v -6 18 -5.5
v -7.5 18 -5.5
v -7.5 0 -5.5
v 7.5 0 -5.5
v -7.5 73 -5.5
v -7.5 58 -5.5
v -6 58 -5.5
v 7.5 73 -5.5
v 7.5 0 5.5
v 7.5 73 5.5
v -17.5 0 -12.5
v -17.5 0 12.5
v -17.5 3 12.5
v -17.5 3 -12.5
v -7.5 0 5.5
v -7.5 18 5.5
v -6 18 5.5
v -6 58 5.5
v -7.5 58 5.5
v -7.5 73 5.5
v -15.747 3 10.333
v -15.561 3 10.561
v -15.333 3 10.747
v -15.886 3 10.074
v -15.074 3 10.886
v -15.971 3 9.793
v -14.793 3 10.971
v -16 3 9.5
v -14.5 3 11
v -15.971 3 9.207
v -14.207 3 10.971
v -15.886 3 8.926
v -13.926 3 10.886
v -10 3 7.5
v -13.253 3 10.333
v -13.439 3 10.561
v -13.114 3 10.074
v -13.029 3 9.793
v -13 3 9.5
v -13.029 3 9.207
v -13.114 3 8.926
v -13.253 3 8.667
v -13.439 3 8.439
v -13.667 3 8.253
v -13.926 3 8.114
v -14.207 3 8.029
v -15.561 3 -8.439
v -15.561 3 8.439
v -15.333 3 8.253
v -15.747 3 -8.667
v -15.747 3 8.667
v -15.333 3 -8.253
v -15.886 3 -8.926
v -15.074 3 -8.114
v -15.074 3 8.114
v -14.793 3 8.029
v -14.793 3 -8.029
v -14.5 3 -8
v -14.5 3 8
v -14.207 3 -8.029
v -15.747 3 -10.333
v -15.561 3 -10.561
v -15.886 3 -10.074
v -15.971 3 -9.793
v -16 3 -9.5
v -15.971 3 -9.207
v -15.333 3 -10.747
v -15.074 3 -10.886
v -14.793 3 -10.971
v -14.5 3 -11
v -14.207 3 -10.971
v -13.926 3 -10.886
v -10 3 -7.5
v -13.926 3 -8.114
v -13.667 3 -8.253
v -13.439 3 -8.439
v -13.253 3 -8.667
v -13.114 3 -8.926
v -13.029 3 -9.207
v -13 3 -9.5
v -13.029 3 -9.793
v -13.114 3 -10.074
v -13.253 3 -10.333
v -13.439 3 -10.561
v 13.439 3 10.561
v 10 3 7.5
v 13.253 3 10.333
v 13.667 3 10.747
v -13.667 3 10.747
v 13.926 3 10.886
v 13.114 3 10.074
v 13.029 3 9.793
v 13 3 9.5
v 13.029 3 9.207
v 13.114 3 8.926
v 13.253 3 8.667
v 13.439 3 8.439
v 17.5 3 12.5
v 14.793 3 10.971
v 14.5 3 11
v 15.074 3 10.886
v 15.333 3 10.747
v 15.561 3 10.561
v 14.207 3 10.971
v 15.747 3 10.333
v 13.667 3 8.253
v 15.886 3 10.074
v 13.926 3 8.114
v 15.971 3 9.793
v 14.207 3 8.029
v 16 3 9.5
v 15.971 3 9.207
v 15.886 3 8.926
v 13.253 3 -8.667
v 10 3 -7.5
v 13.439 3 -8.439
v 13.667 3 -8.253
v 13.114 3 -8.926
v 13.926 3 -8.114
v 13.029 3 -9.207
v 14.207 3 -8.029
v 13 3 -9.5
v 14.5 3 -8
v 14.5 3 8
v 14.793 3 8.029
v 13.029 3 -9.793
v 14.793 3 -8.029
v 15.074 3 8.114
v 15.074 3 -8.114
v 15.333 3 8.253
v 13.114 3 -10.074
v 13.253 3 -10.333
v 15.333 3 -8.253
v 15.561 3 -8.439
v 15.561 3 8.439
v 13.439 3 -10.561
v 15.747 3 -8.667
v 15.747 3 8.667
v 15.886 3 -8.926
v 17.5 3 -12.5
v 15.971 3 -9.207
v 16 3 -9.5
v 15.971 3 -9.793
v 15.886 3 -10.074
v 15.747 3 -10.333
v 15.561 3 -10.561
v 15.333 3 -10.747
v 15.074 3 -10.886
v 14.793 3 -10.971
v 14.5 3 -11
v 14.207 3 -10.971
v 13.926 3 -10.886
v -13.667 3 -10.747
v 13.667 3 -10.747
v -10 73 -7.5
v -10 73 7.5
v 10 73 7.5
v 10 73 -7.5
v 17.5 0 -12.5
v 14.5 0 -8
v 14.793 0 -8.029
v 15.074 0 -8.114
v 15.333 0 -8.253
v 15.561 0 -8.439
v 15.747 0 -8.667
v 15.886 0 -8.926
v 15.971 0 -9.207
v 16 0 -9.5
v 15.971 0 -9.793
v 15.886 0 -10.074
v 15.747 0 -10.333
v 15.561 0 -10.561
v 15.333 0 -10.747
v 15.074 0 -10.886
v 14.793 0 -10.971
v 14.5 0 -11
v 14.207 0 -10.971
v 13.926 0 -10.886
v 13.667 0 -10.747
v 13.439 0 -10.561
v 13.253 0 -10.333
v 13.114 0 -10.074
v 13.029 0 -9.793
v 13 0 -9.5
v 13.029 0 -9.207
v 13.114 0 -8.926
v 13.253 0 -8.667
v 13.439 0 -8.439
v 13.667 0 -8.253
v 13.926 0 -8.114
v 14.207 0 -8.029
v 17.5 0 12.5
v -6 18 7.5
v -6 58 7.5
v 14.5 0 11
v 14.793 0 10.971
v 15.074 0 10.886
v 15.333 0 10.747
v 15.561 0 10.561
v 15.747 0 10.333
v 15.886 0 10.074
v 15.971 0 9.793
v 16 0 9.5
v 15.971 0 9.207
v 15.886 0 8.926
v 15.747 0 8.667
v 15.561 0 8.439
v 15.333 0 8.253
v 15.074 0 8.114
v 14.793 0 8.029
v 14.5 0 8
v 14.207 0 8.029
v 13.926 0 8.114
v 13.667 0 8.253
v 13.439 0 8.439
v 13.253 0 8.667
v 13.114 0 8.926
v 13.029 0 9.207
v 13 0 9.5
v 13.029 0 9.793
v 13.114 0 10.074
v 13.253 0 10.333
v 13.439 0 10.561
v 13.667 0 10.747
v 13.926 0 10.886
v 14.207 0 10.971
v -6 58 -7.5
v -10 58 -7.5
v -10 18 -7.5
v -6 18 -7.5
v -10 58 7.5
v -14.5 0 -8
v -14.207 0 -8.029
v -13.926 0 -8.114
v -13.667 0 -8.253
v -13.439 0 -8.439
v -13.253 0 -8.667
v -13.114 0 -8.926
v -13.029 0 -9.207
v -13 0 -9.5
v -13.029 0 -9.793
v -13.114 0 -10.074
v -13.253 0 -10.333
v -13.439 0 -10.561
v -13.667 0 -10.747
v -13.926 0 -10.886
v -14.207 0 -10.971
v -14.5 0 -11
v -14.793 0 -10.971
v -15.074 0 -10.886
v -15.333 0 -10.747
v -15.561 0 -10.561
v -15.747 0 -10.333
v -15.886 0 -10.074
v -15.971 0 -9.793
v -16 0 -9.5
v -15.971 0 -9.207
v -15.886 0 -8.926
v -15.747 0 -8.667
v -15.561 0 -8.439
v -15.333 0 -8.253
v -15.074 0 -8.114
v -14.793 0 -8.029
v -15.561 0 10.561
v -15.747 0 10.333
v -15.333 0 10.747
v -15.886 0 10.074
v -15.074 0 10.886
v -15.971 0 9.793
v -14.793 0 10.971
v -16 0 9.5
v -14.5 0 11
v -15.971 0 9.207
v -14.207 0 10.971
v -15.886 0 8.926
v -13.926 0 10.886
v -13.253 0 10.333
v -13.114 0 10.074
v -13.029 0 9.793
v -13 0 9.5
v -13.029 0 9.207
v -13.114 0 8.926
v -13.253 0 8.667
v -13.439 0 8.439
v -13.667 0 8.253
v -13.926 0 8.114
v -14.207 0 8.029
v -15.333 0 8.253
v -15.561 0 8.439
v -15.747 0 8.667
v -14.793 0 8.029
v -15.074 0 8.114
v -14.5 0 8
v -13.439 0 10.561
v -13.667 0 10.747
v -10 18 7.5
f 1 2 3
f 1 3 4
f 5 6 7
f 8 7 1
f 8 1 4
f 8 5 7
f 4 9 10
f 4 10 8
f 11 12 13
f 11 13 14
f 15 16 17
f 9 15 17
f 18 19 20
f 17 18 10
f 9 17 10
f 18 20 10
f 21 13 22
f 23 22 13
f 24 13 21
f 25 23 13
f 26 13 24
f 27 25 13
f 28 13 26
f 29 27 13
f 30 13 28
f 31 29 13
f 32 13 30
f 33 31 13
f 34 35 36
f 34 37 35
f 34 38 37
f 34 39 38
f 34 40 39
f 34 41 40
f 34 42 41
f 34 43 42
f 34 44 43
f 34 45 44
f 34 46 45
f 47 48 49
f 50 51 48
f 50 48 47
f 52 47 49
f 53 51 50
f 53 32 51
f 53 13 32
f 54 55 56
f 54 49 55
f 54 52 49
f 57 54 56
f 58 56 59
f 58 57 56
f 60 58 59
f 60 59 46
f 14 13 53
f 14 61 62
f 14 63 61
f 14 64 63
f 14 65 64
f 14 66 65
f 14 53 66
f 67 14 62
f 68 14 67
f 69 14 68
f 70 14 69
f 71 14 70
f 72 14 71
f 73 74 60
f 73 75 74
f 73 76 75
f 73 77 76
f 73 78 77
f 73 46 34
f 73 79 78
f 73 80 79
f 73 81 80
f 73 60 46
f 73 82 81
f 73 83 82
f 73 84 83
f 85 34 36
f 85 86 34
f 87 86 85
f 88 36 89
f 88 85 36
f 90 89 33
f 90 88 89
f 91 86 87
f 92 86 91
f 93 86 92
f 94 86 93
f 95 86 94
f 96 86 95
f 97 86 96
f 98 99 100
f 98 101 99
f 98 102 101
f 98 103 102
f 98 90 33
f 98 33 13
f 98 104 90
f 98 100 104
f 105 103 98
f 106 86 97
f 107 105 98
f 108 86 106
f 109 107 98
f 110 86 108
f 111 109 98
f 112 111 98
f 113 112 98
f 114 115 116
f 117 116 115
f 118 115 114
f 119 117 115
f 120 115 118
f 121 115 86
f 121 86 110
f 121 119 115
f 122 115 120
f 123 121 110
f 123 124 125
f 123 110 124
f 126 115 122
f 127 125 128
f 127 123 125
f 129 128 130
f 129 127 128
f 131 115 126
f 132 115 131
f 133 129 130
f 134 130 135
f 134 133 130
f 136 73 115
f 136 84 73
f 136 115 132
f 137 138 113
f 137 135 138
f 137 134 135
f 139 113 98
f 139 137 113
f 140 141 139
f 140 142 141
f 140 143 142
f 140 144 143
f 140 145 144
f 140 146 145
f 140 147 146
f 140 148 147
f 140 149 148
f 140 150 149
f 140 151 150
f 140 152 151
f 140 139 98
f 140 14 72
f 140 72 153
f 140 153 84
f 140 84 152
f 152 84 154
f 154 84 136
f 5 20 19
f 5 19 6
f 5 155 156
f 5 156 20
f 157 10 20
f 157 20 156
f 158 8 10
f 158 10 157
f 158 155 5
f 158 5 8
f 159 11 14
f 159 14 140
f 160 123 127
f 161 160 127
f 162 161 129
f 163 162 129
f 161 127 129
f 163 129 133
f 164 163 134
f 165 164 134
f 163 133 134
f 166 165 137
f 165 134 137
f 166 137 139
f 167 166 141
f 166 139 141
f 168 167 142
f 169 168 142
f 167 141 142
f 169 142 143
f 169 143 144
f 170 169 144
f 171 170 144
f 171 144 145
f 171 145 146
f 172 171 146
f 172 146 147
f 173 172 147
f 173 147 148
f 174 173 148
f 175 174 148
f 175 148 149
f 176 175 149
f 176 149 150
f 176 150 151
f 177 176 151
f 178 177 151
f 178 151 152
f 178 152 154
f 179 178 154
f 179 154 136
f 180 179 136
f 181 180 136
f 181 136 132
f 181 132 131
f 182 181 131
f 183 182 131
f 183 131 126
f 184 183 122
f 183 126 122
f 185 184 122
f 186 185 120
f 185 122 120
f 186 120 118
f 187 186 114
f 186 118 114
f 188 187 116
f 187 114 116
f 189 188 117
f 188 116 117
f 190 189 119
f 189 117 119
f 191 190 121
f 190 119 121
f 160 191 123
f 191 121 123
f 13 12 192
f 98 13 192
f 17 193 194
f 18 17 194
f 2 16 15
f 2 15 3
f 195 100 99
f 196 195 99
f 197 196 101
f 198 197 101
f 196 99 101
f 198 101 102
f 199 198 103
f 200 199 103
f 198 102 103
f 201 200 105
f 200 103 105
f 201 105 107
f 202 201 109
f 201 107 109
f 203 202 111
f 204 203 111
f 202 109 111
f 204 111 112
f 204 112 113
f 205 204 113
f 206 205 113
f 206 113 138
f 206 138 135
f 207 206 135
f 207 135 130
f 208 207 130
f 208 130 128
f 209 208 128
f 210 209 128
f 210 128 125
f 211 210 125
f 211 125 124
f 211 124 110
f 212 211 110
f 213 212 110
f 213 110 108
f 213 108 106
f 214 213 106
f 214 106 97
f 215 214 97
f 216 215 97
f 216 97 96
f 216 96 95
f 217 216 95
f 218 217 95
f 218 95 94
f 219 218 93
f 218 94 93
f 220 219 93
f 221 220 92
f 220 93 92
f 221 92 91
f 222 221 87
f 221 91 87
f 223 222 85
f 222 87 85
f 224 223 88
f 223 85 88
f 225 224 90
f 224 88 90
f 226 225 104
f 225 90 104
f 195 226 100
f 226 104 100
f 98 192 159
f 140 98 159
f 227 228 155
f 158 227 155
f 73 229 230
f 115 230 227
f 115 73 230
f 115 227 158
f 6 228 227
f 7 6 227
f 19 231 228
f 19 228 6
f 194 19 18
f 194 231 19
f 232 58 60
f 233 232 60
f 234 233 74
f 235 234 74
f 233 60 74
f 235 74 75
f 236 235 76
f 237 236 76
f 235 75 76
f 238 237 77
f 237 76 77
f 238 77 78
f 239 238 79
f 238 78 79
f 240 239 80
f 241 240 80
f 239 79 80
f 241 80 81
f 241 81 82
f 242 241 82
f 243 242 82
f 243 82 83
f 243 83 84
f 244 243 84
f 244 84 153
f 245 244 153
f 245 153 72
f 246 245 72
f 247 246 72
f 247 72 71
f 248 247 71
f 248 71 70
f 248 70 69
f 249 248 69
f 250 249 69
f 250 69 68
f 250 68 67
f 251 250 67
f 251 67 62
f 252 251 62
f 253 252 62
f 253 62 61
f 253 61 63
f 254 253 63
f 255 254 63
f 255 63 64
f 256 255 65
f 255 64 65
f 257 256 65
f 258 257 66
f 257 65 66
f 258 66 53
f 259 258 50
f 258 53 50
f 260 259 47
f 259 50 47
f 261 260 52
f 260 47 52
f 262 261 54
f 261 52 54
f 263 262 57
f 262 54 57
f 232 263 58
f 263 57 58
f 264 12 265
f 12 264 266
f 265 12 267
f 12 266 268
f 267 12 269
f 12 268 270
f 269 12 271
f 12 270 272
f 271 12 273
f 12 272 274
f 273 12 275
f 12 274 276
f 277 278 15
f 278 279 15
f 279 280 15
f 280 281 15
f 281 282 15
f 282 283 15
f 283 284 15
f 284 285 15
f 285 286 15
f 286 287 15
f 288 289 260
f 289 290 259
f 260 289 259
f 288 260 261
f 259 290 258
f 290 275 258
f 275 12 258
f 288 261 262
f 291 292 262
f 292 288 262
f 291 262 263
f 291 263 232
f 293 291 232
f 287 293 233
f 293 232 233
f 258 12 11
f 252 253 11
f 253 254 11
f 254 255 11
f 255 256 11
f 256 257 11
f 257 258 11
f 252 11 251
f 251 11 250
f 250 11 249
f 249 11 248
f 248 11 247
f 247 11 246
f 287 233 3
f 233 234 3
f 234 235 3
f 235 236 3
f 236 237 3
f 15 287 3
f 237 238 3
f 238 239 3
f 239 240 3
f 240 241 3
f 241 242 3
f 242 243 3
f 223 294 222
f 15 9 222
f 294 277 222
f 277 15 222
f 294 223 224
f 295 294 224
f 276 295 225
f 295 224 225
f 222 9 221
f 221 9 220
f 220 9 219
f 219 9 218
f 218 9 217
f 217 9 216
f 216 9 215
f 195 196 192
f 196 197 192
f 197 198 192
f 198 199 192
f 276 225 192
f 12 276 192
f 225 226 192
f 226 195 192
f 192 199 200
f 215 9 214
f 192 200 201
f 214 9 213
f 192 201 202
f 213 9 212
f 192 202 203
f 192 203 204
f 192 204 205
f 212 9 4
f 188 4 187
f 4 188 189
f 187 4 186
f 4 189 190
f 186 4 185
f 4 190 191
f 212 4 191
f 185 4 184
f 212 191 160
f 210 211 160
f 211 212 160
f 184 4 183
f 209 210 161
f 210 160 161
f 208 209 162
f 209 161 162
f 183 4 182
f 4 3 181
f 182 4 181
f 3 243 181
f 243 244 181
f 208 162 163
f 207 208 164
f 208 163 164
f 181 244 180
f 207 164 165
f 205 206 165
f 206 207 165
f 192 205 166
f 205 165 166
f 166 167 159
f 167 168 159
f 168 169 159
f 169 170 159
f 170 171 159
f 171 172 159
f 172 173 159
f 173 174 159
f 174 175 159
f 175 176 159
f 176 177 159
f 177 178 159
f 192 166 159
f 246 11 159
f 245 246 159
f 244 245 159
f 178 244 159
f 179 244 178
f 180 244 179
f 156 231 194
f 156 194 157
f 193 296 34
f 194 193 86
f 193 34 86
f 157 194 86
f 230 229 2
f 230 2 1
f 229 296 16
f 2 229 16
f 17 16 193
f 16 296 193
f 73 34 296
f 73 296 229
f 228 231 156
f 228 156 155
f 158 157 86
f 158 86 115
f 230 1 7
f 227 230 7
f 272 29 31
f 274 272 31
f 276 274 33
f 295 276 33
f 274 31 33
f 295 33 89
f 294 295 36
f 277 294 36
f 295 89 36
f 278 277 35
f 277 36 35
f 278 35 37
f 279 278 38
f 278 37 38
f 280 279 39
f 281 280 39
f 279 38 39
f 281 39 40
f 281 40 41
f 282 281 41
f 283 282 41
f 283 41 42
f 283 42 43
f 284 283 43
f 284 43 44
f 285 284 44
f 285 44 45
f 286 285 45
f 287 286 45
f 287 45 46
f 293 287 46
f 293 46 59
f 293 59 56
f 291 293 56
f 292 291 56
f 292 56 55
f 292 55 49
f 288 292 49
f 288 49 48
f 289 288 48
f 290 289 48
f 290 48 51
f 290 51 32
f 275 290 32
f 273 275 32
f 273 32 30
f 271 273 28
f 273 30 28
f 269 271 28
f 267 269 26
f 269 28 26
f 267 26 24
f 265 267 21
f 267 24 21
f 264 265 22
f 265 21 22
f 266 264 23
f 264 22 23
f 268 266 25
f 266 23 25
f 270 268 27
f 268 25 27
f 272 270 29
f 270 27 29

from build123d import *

# Parameters (mm, degrees)
SKETCH_1_W          = 35
SKETCH_1_H          = 25
EXTRUDE_1_DEPTH     = 3
SKETCH_2_W          = 20
SKETCH_2_H          = 15
EXTRUDE_2_DEPTH     = 70
CUT_EXTRUDE_1_REACH = 78.102
SKETCH_3_W          = 15
SKETCH_3_H          = 11
CUT_EXTRUDE_2_REACH = 79.687
SKETCH_4_W          = 4
SKETCH_4_H          = 40
CUT_EXTRUDE_3_REACH = 75.229
SKETCH_5_R          = 1.5


with BuildPart() as part:
    # 草图1 → 凸台-拉伸1 (new body)
    with BuildSketch(Plane(origin=(0, 0, 0), x_dir=(1, 0, 0), z_dir=(0, 1, 0))):
        Rectangle(SKETCH_1_W, SKETCH_1_H)
    extrude(amount=EXTRUDE_1_DEPTH)

    # 草图2 → 凸台-拉伸2 (add)
    with BuildSketch(Plane(origin=(0, 3, 0), x_dir=(1, 0, 0), z_dir=(0, 1, 0))):
        Rectangle(SKETCH_2_W, SKETCH_2_H)
    extrude(amount=EXTRUDE_2_DEPTH)

    # 草图3 → 切除-拉伸1 (cut, up to next)
    with BuildSketch(Plane(origin=(0, 73, 0), x_dir=(1, 0, 0), z_dir=(0, 1, 0)), mode=Mode.PRIVATE) as cut_extrude_1_sk1:
        Rectangle(SKETCH_3_W, SKETCH_3_H)
    cut_extrude_1_tool1 = extrude(cut_extrude_1_sk1.sketch, amount=-CUT_EXTRUDE_1_REACH, mode=Mode.PRIVATE) & part.part
    add(cut_extrude_1_tool1.solids().sort_by_distance((0, 73, 0))[0], mode=Mode.SUBTRACT)

    # 草图4 → 切除-拉伸2 (cut, up to next)
    with BuildSketch(Plane.XY.offset(7.5), mode=Mode.PRIVATE) as cut_extrude_2_sk1:
        with Locations((-8, 38)):
            Rectangle(SKETCH_4_W, SKETCH_4_H)
    cut_extrude_2_tool1 = extrude(cut_extrude_2_sk1.sketch, amount=-CUT_EXTRUDE_2_REACH, mode=Mode.PRIVATE) & part.part
    add(cut_extrude_2_tool1.solids().sort_by_distance((-8, 38, 7.5))[0], mode=Mode.SUBTRACT)

    # 草图5 → 切除-拉伸3 (cut, up to next)
    with BuildSketch(Plane(origin=(0, 3, 0), x_dir=(1, 0, 0), z_dir=(0, 1, 0)), mode=Mode.PRIVATE) as cut_extrude_3_sk1:
        with Locations(Location((-14.5, 9.5, 0), (0, 0, 270))):
            Circle(SKETCH_5_R)
    cut_extrude_3_tool1 = extrude(cut_extrude_3_sk1.sketch, amount=-CUT_EXTRUDE_3_REACH, mode=Mode.PRIVATE) & part.part
    # 草图5 → 切除-拉伸3 (cut, up to next)
    with BuildSketch(Plane(origin=(0, 3, 0), x_dir=(1, 0, 0), z_dir=(0, 1, 0)), mode=Mode.PRIVATE) as cut_extrude_3_sk2:
        with Locations(Location((14.5, 9.5, 0), (0, 0, 270))):
            Circle(SKETCH_5_R)
    cut_extrude_3_tool2 = extrude(cut_extrude_3_sk2.sketch, amount=-CUT_EXTRUDE_3_REACH, mode=Mode.PRIVATE) & part.part
    # 草图5 → 切除-拉伸3 (cut, up to next)
    with BuildSketch(Plane(origin=(0, 3, 0), x_dir=(1, 0, 0), z_dir=(0, 1, 0)), mode=Mode.PRIVATE) as cut_extrude_3_sk3:
        with Locations(Location((-14.5, -9.5, 0), (0, 0, 270))):
            Circle(SKETCH_5_R)
    cut_extrude_3_tool3 = extrude(cut_extrude_3_sk3.sketch, amount=-CUT_EXTRUDE_3_REACH, mode=Mode.PRIVATE) & part.part
    # 草图5 → 切除-拉伸3 (cut, up to next)
    with BuildSketch(Plane(origin=(0, 3, 0), x_dir=(1, 0, 0), z_dir=(0, 1, 0)), mode=Mode.PRIVATE) as cut_extrude_3_sk4:
        with Locations(Location((14.5, -9.5, 0), (0, 0, 270))):
            Circle(SKETCH_5_R)
    cut_extrude_3_tool4 = extrude(cut_extrude_3_sk4.sketch, amount=-CUT_EXTRUDE_3_REACH, mode=Mode.PRIVATE) & part.part
    add(cut_extrude_3_tool1.solids().sort_by_distance((-14.5, 3, -9.5))[0], mode=Mode.SUBTRACT)
    add(cut_extrude_3_tool2.solids().sort_by_distance((14.5, 3, -9.5))[0], mode=Mode.SUBTRACT)
    add(cut_extrude_3_tool3.solids().sort_by_distance((-14.5, 3, 9.5))[0], mode=Mode.SUBTRACT)
    add(cut_extrude_3_tool4.solids().sort_by_distance((14.5, 3, 9.5))[0], mode=Mode.SUBTRACT)


solid = part.part
